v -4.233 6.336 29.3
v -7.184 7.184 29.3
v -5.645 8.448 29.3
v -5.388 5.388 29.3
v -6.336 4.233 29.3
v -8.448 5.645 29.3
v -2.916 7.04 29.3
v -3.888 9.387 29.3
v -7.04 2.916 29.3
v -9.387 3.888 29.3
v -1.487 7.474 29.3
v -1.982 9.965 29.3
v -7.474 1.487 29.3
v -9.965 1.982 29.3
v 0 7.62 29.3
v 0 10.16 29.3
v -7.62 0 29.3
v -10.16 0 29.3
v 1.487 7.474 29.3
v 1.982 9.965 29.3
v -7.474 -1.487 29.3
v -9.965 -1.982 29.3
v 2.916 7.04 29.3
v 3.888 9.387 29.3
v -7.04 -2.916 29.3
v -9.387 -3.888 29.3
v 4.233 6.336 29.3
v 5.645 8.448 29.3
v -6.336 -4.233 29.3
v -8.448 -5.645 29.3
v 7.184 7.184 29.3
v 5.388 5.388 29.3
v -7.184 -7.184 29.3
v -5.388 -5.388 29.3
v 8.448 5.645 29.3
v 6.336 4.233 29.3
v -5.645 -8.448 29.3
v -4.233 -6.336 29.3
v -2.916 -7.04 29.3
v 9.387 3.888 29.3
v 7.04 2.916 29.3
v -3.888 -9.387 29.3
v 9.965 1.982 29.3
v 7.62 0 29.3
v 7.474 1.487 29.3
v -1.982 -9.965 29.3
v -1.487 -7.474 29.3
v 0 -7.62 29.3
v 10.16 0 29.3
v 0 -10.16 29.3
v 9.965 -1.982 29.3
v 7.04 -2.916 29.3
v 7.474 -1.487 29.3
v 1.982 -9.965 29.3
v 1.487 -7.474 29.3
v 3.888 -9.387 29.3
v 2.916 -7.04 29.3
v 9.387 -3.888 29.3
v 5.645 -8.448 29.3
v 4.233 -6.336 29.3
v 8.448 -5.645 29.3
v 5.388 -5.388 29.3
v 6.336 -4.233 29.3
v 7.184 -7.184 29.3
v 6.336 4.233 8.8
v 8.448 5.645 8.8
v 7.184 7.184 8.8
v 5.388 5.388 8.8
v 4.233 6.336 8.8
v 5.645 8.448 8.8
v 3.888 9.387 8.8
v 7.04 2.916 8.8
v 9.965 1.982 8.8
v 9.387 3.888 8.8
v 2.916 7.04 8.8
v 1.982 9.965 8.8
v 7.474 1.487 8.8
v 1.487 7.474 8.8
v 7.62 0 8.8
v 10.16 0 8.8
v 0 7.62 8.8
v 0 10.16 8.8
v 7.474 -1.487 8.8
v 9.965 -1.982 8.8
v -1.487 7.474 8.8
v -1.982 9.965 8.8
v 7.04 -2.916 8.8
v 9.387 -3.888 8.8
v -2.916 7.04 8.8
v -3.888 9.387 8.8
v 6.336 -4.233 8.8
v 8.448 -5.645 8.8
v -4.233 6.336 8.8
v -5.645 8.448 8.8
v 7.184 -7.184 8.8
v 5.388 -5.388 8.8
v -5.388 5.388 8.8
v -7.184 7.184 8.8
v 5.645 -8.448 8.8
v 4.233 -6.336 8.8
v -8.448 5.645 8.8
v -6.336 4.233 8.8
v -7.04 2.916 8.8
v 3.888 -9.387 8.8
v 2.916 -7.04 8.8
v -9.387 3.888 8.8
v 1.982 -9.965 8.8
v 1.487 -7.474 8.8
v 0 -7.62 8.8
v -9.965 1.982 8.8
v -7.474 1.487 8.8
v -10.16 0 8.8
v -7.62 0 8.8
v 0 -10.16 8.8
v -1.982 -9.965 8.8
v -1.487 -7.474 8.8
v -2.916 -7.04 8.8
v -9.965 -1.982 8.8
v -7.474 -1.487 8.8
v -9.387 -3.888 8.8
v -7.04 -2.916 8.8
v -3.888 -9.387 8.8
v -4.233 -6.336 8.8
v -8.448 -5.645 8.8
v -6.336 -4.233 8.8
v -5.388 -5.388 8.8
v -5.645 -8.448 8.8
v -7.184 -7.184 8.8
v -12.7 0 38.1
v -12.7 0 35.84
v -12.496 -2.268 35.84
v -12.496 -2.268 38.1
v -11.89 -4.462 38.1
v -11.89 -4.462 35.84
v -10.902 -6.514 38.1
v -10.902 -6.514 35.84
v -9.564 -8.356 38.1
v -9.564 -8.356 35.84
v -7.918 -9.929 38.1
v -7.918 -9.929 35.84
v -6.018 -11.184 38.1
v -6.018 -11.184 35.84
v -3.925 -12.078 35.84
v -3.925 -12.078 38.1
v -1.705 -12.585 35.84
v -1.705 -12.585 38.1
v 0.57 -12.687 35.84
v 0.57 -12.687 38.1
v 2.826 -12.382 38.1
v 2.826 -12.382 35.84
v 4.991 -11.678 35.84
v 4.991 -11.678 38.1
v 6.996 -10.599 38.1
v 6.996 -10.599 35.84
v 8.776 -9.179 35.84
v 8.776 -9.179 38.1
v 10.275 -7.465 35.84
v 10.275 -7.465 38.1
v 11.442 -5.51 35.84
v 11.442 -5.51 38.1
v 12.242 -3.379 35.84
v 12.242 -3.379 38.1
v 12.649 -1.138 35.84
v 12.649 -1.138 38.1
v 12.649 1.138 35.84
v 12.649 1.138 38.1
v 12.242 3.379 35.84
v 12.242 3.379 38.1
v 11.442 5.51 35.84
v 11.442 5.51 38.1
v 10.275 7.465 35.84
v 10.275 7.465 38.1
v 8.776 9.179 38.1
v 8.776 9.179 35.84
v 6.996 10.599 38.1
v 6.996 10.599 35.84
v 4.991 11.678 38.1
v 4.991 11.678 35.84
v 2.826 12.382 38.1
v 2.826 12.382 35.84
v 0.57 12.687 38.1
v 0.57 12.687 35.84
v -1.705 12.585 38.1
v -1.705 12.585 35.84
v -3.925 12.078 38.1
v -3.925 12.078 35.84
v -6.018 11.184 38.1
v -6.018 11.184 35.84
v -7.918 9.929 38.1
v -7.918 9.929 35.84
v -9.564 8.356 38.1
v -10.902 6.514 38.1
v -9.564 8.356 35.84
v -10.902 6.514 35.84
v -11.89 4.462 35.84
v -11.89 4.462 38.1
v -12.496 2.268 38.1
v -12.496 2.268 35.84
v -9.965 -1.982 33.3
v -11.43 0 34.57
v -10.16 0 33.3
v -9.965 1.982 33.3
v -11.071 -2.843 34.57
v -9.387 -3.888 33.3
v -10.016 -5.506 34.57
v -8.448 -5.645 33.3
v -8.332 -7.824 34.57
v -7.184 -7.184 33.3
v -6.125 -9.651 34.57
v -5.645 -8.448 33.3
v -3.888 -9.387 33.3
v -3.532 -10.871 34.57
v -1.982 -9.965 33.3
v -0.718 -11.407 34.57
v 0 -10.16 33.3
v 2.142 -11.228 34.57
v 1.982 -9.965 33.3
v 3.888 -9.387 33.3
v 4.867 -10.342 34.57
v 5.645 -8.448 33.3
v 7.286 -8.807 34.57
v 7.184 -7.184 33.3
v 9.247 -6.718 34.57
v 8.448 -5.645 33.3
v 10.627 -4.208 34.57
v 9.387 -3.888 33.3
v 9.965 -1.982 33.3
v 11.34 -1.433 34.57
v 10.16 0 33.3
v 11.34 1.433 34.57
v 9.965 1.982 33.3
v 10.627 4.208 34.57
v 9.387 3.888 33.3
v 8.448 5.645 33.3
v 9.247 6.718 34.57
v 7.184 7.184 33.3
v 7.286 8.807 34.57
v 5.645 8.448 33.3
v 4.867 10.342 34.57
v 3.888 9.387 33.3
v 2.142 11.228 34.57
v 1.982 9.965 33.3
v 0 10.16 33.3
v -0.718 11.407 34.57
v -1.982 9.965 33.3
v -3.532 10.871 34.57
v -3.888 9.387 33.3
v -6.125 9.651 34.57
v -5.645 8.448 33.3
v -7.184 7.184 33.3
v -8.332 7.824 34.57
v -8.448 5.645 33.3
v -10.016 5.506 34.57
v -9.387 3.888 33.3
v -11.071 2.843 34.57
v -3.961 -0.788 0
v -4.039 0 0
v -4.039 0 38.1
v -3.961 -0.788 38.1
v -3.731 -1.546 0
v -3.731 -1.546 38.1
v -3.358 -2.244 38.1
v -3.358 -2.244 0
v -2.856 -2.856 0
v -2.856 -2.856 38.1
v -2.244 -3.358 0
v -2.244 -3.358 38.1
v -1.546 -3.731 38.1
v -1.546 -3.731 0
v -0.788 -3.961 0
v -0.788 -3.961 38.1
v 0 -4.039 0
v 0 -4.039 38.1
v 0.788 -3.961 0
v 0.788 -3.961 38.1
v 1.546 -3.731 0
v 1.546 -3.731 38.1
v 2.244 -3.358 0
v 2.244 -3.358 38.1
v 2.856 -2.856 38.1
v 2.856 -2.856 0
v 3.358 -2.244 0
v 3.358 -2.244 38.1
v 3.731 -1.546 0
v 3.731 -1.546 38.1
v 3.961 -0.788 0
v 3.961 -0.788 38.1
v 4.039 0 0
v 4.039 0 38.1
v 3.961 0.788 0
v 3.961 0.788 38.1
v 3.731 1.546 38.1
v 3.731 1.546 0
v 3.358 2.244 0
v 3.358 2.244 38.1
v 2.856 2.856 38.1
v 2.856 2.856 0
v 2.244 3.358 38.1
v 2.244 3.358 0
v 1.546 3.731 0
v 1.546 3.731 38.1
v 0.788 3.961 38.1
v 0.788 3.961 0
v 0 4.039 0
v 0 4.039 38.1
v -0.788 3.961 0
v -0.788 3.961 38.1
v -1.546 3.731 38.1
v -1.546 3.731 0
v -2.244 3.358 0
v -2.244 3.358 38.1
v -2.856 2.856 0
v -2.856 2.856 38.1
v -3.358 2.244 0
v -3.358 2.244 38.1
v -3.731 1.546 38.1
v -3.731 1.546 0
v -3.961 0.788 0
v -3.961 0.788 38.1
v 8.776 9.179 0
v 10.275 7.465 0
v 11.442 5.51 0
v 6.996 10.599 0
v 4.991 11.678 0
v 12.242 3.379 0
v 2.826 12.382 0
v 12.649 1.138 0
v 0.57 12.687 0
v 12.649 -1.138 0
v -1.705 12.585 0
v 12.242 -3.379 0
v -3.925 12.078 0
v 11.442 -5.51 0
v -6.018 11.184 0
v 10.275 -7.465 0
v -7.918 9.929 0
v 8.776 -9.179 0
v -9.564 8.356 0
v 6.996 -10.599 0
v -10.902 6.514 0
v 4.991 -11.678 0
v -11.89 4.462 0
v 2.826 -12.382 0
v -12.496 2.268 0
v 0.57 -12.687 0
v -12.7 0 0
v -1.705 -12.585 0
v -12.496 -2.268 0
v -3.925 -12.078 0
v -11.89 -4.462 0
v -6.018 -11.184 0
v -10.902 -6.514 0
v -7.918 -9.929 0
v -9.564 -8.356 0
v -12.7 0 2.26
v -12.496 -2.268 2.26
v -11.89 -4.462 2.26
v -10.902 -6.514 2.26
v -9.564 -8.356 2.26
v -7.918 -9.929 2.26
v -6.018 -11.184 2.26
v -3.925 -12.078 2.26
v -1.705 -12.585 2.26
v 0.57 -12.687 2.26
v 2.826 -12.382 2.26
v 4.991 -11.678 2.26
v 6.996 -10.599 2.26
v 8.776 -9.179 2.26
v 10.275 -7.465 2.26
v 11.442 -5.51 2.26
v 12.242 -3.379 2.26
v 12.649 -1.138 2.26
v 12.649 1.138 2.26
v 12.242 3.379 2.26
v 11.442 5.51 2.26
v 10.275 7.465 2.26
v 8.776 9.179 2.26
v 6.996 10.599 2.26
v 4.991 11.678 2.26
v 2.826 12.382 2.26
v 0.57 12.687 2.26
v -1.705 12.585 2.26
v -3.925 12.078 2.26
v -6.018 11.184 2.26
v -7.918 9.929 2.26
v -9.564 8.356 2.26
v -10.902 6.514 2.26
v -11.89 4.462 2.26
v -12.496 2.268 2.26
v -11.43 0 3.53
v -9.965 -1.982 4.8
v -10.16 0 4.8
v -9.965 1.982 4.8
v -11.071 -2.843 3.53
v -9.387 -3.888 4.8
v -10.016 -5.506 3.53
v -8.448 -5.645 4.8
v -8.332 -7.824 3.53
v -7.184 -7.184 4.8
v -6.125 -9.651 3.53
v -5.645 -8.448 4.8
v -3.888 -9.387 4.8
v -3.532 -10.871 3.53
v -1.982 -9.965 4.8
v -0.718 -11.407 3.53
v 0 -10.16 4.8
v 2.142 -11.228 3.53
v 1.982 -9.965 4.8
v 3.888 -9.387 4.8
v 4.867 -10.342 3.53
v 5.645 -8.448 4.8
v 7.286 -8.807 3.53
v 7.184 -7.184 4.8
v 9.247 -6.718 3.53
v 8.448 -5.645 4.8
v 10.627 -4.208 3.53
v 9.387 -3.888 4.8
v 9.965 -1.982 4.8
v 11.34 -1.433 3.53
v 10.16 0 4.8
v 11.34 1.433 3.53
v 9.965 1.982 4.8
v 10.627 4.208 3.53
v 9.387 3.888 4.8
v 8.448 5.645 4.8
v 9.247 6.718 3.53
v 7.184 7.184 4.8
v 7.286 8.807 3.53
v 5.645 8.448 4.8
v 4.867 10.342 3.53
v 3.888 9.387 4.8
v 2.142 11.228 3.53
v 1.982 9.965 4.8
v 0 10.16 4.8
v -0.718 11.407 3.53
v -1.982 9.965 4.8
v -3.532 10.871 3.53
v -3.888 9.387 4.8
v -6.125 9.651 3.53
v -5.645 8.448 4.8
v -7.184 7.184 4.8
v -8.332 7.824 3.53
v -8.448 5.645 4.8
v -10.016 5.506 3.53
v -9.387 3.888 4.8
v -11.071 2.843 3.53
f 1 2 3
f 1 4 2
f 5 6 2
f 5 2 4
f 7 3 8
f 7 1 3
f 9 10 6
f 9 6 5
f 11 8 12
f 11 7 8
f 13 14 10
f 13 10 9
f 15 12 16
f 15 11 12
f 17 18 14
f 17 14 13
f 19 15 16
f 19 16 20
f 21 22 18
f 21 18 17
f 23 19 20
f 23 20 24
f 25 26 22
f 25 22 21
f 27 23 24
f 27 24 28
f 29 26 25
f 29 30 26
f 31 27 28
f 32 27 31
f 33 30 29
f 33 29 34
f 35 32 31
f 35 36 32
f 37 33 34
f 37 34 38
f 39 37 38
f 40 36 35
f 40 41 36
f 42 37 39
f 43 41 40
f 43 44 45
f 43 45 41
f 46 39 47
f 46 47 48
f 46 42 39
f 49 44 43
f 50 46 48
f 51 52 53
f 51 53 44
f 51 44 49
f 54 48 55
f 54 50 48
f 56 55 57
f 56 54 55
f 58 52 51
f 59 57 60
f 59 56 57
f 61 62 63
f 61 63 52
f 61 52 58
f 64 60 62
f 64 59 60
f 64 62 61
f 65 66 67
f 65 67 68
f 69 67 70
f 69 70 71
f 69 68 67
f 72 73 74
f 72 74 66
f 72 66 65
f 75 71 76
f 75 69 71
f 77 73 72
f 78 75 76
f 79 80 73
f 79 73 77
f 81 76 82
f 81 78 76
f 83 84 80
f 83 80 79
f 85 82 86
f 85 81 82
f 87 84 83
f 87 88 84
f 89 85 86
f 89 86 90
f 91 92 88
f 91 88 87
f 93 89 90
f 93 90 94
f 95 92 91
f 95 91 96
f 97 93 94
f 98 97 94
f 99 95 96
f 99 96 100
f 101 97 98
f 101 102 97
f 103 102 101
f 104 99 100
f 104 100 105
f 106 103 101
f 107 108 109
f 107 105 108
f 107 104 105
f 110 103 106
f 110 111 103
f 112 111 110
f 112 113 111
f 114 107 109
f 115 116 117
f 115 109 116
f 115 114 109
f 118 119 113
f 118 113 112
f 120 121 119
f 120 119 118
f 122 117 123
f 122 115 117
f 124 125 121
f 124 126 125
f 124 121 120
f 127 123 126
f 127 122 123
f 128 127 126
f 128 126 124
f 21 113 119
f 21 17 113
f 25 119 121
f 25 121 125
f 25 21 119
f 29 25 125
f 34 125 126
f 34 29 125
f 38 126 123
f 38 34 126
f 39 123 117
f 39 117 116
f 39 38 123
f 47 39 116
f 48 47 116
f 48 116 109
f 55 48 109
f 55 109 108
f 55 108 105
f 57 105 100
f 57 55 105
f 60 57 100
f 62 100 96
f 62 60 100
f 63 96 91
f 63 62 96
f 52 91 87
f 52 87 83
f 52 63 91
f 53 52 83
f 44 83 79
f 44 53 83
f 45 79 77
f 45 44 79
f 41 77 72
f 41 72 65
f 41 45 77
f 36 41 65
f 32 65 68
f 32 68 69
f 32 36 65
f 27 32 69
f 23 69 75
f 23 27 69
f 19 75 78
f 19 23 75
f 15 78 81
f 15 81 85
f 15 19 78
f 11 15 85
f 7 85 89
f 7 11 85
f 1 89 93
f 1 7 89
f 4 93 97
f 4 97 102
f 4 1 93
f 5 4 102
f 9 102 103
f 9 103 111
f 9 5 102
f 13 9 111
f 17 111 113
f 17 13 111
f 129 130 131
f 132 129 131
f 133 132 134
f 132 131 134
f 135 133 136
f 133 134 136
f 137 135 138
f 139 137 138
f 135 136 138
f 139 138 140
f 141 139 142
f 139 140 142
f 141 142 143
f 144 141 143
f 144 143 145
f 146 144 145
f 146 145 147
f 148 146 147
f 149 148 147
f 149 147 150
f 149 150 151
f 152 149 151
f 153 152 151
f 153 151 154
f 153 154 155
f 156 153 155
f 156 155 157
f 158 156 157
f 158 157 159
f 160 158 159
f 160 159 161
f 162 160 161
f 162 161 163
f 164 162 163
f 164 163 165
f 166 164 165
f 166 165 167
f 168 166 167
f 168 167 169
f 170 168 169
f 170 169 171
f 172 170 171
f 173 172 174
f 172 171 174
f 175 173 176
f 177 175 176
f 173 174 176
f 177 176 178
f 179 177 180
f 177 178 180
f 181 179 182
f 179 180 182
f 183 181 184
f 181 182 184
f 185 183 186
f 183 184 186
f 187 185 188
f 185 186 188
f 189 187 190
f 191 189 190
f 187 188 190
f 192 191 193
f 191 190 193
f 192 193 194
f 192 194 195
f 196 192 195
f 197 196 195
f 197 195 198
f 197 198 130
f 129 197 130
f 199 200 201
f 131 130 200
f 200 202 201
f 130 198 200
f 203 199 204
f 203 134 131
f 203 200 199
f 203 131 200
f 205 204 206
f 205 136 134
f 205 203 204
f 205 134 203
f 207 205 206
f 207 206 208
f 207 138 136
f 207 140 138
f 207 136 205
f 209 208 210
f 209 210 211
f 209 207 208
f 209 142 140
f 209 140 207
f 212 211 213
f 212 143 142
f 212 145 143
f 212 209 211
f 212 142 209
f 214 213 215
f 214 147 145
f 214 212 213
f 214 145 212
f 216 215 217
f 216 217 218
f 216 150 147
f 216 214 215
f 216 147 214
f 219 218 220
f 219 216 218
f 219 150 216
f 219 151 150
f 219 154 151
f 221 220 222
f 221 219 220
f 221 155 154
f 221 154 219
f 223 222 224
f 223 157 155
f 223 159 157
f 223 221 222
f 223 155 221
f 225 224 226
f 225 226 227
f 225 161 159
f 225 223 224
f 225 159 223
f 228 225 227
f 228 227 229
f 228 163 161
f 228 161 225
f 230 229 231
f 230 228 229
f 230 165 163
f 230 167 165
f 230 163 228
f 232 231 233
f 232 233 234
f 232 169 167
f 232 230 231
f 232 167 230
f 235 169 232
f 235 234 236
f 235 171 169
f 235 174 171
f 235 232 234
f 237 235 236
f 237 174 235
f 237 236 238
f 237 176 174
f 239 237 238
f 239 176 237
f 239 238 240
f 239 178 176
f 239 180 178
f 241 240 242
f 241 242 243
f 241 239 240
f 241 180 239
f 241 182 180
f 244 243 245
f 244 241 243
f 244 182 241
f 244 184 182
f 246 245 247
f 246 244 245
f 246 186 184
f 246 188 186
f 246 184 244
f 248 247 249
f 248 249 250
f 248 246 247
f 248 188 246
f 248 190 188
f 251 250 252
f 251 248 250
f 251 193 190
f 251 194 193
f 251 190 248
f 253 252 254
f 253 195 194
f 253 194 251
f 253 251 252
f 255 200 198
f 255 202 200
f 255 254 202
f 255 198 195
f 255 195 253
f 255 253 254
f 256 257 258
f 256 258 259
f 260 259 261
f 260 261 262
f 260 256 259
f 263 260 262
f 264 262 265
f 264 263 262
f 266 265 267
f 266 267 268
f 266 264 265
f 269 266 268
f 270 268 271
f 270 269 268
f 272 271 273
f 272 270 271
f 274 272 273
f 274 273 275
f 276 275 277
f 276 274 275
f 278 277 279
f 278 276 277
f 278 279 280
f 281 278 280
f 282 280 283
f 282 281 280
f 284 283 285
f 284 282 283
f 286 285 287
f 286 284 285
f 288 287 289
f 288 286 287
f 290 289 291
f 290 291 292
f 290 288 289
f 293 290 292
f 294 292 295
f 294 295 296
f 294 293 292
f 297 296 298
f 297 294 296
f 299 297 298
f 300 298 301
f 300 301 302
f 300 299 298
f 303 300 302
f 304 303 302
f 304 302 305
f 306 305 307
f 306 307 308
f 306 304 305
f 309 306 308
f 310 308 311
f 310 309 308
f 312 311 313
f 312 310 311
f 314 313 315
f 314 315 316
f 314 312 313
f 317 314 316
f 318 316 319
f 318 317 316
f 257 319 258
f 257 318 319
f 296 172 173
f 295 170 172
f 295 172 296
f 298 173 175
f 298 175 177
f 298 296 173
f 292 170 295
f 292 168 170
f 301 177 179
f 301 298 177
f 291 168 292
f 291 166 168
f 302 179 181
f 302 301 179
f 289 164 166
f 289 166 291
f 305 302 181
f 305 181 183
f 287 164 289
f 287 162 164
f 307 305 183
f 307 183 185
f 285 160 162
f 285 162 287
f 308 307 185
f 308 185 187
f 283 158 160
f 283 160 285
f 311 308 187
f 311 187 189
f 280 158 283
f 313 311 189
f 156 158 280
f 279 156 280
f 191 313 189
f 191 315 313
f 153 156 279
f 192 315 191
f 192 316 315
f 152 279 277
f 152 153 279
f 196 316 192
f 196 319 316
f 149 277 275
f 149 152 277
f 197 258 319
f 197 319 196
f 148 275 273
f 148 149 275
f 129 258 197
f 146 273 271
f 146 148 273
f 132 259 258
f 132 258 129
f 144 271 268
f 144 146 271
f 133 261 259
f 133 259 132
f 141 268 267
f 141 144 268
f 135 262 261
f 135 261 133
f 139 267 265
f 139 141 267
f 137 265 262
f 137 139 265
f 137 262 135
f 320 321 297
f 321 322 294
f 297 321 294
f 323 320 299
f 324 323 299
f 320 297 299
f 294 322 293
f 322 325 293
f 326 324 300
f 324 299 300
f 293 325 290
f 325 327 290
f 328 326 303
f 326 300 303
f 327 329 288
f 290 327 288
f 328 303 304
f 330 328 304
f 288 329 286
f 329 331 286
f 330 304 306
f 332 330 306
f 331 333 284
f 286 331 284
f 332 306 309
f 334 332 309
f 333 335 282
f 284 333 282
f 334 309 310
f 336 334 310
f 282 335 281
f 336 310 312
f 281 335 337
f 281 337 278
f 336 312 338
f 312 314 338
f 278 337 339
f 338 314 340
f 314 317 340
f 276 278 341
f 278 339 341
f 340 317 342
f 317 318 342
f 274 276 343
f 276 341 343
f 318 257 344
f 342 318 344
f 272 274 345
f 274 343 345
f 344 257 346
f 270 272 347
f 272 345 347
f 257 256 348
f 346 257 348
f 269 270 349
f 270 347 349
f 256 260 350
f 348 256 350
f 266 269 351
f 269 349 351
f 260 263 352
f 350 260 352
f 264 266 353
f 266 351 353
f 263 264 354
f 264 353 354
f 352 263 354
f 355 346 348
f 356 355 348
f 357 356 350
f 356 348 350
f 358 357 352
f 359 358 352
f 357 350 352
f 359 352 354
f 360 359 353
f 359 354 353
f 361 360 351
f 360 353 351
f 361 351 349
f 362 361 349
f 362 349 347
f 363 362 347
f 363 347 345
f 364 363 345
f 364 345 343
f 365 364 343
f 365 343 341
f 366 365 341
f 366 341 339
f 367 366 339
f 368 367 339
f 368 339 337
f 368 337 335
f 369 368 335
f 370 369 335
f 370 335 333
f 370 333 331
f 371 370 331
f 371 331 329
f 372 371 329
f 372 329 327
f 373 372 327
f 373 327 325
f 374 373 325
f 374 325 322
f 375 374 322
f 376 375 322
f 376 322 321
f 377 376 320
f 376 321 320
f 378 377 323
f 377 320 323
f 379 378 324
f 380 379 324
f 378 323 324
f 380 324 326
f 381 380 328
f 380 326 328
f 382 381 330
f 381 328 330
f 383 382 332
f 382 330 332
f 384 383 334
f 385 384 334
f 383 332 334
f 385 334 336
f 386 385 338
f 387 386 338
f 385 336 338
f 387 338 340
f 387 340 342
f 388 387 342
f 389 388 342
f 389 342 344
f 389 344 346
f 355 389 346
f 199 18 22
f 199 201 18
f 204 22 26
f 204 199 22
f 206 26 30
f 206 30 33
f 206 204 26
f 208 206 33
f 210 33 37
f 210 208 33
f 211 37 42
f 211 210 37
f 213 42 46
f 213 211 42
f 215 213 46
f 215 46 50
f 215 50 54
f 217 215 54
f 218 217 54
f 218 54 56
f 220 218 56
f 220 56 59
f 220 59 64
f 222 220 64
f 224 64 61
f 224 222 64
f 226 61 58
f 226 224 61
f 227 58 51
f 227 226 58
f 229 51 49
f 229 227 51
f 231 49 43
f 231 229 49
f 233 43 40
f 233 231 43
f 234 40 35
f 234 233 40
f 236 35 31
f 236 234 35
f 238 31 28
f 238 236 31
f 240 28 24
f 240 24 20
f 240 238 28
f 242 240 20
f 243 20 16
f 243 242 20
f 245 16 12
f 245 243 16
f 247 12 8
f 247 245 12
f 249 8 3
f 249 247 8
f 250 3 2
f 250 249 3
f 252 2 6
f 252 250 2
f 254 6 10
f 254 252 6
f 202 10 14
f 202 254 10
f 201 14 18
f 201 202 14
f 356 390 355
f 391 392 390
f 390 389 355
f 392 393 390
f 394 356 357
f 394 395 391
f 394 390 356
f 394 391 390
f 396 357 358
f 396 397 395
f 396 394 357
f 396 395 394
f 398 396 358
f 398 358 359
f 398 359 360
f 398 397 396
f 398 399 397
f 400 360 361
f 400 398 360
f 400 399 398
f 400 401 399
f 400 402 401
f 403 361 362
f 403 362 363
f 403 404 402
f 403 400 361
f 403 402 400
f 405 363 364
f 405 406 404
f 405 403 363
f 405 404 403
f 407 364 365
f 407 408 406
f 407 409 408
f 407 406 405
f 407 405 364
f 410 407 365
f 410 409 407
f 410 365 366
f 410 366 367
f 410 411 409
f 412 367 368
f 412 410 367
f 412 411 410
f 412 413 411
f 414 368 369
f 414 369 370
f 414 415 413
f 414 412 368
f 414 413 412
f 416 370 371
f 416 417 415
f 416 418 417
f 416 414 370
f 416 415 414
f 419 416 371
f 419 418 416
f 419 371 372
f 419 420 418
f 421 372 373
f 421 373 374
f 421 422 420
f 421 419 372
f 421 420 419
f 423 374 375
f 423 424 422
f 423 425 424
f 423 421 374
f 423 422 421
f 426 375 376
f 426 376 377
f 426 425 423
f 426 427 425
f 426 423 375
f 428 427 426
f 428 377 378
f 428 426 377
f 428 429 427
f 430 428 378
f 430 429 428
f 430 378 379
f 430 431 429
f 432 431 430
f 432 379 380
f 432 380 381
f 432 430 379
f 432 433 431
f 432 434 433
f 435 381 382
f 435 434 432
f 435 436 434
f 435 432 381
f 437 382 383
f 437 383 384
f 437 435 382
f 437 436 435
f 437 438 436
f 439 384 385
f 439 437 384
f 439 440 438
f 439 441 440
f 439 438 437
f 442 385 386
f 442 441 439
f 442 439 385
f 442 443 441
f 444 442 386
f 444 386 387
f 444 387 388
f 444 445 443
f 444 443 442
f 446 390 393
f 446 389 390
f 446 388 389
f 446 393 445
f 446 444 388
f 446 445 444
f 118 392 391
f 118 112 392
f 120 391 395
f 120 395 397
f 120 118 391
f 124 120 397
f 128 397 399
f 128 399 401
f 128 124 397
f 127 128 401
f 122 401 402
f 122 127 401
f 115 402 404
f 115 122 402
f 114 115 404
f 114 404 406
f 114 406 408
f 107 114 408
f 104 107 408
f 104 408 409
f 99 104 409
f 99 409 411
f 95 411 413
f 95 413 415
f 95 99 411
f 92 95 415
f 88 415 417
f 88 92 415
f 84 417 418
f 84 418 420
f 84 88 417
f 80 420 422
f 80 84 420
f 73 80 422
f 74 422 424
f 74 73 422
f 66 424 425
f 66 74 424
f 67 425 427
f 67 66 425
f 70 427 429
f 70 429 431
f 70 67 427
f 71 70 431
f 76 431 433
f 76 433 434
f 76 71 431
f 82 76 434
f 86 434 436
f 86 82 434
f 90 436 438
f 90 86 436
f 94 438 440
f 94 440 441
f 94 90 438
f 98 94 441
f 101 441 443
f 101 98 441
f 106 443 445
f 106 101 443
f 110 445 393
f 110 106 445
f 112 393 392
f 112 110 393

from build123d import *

# Parameters (mm, degrees)
SKETCH1_R           = 12.7
SKETCH1_R_2         = 4.0386
BOSS_EXTRUDE1_DEPTH = 38.1


with BuildPart() as part:
    # Sketch1 → Boss-Extrude1 (new body)
    with BuildSketch(Plane.XY):
        with Locations(Location((0, 0, 0), (0, 0, 180))):
            Circle(SKETCH1_R)
        with Locations(Location((0, 0, 0), (0, 0, 180))):
            Circle(SKETCH1_R_2, mode=Mode.SUBTRACT)
    extrude(amount=BOSS_EXTRUDE1_DEPTH)

    # Sketch2 → Cut-Revolve1 (revolve, cut)
    with BuildSketch(Plane(origin=(0, 0, 0), x_dir=(1, 0, 0), z_dir=(0, 1, 0)), mode=Mode.PRIVATE) as cut_revolve1_sk:
        Polygon((10.16, -33.3), (12.7, -35.84), (12.7, -2.26), (10.16, -4.8), (10.16, -8.8), (7.62, -8.8), (7.62, -29.3), (10.16, -29.3), align=None)
    revolve(cut_revolve1_sk.sketch.rotate(Axis((0, 0, 0), (0, 0, 1)), 180), axis=Axis((0, 0, 0), (0, 0, 1)), mode=Mode.SUBTRACT)


solid = part.part
